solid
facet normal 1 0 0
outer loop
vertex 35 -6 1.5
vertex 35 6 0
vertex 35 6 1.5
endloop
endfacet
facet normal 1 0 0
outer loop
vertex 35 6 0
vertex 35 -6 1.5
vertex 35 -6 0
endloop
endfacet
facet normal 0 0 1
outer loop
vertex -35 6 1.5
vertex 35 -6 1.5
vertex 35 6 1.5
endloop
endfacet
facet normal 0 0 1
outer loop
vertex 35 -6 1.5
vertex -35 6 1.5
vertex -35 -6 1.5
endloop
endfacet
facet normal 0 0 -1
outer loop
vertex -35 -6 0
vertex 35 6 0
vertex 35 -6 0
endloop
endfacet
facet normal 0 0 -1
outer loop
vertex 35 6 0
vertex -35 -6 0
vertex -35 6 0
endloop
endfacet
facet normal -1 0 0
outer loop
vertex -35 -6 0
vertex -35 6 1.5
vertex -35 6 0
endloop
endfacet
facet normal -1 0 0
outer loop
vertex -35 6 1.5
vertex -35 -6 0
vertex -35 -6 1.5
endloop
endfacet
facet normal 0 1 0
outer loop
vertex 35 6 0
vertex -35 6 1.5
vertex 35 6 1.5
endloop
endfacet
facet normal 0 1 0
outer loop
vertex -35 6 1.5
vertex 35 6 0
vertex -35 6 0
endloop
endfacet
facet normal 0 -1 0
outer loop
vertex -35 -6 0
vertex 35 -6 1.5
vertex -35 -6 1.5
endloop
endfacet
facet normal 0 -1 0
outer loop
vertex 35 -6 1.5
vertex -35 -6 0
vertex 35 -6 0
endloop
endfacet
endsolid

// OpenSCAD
// 10-well comb for casting agarose gels, printed lying flat
// Units: mm. Print orientation: flat on bed, teeth pointing -Y.

// ---------- Parameters ----------
spine_len      = 70;    // spine (back bar) length (X)
spine_wid      = 12;    // spine width (Y)
plate_thk      = 1.5;   // comb plate thickness (Z)

tooth_count    = 10;    // number of teeth
tooth_w        = 5.0;   // tooth width (X)
tooth_len      = 12;    // tooth length (Y)
tooth_gap      = 1.5;   // gap between neighbouring teeth (X)

eps            = 0.5;   // cutter overshoot past top/bottom faces
$fn            = 64;    // curve resolution

// ---------- Derived ----------
row_wid        = tooth_w * tooth_count + (tooth_count - 1) * tooth_gap;  // 55 mm
y0             = -(spine_wid - row_wid) / 2;                              // row centred on spine

// ---------- Model ----------
difference() {
    // Base plate
    translate([-spine_len / 2, -spine_wid / 2, 0])
        cube([spine_len, spine_wid, plate_thk]);

    // Teeth cut out from -Y side
    for (i = [0 : tooth_count - 1]) {
        x = -row_wid / 2 + i * (tooth_w + tooth_gap);
        translate([x, y0 + i * (tooth_w + tooth_gap), -eps])
            cube([tooth_w, tooth_len, plate_thk + 2 * eps]);
    }
}
